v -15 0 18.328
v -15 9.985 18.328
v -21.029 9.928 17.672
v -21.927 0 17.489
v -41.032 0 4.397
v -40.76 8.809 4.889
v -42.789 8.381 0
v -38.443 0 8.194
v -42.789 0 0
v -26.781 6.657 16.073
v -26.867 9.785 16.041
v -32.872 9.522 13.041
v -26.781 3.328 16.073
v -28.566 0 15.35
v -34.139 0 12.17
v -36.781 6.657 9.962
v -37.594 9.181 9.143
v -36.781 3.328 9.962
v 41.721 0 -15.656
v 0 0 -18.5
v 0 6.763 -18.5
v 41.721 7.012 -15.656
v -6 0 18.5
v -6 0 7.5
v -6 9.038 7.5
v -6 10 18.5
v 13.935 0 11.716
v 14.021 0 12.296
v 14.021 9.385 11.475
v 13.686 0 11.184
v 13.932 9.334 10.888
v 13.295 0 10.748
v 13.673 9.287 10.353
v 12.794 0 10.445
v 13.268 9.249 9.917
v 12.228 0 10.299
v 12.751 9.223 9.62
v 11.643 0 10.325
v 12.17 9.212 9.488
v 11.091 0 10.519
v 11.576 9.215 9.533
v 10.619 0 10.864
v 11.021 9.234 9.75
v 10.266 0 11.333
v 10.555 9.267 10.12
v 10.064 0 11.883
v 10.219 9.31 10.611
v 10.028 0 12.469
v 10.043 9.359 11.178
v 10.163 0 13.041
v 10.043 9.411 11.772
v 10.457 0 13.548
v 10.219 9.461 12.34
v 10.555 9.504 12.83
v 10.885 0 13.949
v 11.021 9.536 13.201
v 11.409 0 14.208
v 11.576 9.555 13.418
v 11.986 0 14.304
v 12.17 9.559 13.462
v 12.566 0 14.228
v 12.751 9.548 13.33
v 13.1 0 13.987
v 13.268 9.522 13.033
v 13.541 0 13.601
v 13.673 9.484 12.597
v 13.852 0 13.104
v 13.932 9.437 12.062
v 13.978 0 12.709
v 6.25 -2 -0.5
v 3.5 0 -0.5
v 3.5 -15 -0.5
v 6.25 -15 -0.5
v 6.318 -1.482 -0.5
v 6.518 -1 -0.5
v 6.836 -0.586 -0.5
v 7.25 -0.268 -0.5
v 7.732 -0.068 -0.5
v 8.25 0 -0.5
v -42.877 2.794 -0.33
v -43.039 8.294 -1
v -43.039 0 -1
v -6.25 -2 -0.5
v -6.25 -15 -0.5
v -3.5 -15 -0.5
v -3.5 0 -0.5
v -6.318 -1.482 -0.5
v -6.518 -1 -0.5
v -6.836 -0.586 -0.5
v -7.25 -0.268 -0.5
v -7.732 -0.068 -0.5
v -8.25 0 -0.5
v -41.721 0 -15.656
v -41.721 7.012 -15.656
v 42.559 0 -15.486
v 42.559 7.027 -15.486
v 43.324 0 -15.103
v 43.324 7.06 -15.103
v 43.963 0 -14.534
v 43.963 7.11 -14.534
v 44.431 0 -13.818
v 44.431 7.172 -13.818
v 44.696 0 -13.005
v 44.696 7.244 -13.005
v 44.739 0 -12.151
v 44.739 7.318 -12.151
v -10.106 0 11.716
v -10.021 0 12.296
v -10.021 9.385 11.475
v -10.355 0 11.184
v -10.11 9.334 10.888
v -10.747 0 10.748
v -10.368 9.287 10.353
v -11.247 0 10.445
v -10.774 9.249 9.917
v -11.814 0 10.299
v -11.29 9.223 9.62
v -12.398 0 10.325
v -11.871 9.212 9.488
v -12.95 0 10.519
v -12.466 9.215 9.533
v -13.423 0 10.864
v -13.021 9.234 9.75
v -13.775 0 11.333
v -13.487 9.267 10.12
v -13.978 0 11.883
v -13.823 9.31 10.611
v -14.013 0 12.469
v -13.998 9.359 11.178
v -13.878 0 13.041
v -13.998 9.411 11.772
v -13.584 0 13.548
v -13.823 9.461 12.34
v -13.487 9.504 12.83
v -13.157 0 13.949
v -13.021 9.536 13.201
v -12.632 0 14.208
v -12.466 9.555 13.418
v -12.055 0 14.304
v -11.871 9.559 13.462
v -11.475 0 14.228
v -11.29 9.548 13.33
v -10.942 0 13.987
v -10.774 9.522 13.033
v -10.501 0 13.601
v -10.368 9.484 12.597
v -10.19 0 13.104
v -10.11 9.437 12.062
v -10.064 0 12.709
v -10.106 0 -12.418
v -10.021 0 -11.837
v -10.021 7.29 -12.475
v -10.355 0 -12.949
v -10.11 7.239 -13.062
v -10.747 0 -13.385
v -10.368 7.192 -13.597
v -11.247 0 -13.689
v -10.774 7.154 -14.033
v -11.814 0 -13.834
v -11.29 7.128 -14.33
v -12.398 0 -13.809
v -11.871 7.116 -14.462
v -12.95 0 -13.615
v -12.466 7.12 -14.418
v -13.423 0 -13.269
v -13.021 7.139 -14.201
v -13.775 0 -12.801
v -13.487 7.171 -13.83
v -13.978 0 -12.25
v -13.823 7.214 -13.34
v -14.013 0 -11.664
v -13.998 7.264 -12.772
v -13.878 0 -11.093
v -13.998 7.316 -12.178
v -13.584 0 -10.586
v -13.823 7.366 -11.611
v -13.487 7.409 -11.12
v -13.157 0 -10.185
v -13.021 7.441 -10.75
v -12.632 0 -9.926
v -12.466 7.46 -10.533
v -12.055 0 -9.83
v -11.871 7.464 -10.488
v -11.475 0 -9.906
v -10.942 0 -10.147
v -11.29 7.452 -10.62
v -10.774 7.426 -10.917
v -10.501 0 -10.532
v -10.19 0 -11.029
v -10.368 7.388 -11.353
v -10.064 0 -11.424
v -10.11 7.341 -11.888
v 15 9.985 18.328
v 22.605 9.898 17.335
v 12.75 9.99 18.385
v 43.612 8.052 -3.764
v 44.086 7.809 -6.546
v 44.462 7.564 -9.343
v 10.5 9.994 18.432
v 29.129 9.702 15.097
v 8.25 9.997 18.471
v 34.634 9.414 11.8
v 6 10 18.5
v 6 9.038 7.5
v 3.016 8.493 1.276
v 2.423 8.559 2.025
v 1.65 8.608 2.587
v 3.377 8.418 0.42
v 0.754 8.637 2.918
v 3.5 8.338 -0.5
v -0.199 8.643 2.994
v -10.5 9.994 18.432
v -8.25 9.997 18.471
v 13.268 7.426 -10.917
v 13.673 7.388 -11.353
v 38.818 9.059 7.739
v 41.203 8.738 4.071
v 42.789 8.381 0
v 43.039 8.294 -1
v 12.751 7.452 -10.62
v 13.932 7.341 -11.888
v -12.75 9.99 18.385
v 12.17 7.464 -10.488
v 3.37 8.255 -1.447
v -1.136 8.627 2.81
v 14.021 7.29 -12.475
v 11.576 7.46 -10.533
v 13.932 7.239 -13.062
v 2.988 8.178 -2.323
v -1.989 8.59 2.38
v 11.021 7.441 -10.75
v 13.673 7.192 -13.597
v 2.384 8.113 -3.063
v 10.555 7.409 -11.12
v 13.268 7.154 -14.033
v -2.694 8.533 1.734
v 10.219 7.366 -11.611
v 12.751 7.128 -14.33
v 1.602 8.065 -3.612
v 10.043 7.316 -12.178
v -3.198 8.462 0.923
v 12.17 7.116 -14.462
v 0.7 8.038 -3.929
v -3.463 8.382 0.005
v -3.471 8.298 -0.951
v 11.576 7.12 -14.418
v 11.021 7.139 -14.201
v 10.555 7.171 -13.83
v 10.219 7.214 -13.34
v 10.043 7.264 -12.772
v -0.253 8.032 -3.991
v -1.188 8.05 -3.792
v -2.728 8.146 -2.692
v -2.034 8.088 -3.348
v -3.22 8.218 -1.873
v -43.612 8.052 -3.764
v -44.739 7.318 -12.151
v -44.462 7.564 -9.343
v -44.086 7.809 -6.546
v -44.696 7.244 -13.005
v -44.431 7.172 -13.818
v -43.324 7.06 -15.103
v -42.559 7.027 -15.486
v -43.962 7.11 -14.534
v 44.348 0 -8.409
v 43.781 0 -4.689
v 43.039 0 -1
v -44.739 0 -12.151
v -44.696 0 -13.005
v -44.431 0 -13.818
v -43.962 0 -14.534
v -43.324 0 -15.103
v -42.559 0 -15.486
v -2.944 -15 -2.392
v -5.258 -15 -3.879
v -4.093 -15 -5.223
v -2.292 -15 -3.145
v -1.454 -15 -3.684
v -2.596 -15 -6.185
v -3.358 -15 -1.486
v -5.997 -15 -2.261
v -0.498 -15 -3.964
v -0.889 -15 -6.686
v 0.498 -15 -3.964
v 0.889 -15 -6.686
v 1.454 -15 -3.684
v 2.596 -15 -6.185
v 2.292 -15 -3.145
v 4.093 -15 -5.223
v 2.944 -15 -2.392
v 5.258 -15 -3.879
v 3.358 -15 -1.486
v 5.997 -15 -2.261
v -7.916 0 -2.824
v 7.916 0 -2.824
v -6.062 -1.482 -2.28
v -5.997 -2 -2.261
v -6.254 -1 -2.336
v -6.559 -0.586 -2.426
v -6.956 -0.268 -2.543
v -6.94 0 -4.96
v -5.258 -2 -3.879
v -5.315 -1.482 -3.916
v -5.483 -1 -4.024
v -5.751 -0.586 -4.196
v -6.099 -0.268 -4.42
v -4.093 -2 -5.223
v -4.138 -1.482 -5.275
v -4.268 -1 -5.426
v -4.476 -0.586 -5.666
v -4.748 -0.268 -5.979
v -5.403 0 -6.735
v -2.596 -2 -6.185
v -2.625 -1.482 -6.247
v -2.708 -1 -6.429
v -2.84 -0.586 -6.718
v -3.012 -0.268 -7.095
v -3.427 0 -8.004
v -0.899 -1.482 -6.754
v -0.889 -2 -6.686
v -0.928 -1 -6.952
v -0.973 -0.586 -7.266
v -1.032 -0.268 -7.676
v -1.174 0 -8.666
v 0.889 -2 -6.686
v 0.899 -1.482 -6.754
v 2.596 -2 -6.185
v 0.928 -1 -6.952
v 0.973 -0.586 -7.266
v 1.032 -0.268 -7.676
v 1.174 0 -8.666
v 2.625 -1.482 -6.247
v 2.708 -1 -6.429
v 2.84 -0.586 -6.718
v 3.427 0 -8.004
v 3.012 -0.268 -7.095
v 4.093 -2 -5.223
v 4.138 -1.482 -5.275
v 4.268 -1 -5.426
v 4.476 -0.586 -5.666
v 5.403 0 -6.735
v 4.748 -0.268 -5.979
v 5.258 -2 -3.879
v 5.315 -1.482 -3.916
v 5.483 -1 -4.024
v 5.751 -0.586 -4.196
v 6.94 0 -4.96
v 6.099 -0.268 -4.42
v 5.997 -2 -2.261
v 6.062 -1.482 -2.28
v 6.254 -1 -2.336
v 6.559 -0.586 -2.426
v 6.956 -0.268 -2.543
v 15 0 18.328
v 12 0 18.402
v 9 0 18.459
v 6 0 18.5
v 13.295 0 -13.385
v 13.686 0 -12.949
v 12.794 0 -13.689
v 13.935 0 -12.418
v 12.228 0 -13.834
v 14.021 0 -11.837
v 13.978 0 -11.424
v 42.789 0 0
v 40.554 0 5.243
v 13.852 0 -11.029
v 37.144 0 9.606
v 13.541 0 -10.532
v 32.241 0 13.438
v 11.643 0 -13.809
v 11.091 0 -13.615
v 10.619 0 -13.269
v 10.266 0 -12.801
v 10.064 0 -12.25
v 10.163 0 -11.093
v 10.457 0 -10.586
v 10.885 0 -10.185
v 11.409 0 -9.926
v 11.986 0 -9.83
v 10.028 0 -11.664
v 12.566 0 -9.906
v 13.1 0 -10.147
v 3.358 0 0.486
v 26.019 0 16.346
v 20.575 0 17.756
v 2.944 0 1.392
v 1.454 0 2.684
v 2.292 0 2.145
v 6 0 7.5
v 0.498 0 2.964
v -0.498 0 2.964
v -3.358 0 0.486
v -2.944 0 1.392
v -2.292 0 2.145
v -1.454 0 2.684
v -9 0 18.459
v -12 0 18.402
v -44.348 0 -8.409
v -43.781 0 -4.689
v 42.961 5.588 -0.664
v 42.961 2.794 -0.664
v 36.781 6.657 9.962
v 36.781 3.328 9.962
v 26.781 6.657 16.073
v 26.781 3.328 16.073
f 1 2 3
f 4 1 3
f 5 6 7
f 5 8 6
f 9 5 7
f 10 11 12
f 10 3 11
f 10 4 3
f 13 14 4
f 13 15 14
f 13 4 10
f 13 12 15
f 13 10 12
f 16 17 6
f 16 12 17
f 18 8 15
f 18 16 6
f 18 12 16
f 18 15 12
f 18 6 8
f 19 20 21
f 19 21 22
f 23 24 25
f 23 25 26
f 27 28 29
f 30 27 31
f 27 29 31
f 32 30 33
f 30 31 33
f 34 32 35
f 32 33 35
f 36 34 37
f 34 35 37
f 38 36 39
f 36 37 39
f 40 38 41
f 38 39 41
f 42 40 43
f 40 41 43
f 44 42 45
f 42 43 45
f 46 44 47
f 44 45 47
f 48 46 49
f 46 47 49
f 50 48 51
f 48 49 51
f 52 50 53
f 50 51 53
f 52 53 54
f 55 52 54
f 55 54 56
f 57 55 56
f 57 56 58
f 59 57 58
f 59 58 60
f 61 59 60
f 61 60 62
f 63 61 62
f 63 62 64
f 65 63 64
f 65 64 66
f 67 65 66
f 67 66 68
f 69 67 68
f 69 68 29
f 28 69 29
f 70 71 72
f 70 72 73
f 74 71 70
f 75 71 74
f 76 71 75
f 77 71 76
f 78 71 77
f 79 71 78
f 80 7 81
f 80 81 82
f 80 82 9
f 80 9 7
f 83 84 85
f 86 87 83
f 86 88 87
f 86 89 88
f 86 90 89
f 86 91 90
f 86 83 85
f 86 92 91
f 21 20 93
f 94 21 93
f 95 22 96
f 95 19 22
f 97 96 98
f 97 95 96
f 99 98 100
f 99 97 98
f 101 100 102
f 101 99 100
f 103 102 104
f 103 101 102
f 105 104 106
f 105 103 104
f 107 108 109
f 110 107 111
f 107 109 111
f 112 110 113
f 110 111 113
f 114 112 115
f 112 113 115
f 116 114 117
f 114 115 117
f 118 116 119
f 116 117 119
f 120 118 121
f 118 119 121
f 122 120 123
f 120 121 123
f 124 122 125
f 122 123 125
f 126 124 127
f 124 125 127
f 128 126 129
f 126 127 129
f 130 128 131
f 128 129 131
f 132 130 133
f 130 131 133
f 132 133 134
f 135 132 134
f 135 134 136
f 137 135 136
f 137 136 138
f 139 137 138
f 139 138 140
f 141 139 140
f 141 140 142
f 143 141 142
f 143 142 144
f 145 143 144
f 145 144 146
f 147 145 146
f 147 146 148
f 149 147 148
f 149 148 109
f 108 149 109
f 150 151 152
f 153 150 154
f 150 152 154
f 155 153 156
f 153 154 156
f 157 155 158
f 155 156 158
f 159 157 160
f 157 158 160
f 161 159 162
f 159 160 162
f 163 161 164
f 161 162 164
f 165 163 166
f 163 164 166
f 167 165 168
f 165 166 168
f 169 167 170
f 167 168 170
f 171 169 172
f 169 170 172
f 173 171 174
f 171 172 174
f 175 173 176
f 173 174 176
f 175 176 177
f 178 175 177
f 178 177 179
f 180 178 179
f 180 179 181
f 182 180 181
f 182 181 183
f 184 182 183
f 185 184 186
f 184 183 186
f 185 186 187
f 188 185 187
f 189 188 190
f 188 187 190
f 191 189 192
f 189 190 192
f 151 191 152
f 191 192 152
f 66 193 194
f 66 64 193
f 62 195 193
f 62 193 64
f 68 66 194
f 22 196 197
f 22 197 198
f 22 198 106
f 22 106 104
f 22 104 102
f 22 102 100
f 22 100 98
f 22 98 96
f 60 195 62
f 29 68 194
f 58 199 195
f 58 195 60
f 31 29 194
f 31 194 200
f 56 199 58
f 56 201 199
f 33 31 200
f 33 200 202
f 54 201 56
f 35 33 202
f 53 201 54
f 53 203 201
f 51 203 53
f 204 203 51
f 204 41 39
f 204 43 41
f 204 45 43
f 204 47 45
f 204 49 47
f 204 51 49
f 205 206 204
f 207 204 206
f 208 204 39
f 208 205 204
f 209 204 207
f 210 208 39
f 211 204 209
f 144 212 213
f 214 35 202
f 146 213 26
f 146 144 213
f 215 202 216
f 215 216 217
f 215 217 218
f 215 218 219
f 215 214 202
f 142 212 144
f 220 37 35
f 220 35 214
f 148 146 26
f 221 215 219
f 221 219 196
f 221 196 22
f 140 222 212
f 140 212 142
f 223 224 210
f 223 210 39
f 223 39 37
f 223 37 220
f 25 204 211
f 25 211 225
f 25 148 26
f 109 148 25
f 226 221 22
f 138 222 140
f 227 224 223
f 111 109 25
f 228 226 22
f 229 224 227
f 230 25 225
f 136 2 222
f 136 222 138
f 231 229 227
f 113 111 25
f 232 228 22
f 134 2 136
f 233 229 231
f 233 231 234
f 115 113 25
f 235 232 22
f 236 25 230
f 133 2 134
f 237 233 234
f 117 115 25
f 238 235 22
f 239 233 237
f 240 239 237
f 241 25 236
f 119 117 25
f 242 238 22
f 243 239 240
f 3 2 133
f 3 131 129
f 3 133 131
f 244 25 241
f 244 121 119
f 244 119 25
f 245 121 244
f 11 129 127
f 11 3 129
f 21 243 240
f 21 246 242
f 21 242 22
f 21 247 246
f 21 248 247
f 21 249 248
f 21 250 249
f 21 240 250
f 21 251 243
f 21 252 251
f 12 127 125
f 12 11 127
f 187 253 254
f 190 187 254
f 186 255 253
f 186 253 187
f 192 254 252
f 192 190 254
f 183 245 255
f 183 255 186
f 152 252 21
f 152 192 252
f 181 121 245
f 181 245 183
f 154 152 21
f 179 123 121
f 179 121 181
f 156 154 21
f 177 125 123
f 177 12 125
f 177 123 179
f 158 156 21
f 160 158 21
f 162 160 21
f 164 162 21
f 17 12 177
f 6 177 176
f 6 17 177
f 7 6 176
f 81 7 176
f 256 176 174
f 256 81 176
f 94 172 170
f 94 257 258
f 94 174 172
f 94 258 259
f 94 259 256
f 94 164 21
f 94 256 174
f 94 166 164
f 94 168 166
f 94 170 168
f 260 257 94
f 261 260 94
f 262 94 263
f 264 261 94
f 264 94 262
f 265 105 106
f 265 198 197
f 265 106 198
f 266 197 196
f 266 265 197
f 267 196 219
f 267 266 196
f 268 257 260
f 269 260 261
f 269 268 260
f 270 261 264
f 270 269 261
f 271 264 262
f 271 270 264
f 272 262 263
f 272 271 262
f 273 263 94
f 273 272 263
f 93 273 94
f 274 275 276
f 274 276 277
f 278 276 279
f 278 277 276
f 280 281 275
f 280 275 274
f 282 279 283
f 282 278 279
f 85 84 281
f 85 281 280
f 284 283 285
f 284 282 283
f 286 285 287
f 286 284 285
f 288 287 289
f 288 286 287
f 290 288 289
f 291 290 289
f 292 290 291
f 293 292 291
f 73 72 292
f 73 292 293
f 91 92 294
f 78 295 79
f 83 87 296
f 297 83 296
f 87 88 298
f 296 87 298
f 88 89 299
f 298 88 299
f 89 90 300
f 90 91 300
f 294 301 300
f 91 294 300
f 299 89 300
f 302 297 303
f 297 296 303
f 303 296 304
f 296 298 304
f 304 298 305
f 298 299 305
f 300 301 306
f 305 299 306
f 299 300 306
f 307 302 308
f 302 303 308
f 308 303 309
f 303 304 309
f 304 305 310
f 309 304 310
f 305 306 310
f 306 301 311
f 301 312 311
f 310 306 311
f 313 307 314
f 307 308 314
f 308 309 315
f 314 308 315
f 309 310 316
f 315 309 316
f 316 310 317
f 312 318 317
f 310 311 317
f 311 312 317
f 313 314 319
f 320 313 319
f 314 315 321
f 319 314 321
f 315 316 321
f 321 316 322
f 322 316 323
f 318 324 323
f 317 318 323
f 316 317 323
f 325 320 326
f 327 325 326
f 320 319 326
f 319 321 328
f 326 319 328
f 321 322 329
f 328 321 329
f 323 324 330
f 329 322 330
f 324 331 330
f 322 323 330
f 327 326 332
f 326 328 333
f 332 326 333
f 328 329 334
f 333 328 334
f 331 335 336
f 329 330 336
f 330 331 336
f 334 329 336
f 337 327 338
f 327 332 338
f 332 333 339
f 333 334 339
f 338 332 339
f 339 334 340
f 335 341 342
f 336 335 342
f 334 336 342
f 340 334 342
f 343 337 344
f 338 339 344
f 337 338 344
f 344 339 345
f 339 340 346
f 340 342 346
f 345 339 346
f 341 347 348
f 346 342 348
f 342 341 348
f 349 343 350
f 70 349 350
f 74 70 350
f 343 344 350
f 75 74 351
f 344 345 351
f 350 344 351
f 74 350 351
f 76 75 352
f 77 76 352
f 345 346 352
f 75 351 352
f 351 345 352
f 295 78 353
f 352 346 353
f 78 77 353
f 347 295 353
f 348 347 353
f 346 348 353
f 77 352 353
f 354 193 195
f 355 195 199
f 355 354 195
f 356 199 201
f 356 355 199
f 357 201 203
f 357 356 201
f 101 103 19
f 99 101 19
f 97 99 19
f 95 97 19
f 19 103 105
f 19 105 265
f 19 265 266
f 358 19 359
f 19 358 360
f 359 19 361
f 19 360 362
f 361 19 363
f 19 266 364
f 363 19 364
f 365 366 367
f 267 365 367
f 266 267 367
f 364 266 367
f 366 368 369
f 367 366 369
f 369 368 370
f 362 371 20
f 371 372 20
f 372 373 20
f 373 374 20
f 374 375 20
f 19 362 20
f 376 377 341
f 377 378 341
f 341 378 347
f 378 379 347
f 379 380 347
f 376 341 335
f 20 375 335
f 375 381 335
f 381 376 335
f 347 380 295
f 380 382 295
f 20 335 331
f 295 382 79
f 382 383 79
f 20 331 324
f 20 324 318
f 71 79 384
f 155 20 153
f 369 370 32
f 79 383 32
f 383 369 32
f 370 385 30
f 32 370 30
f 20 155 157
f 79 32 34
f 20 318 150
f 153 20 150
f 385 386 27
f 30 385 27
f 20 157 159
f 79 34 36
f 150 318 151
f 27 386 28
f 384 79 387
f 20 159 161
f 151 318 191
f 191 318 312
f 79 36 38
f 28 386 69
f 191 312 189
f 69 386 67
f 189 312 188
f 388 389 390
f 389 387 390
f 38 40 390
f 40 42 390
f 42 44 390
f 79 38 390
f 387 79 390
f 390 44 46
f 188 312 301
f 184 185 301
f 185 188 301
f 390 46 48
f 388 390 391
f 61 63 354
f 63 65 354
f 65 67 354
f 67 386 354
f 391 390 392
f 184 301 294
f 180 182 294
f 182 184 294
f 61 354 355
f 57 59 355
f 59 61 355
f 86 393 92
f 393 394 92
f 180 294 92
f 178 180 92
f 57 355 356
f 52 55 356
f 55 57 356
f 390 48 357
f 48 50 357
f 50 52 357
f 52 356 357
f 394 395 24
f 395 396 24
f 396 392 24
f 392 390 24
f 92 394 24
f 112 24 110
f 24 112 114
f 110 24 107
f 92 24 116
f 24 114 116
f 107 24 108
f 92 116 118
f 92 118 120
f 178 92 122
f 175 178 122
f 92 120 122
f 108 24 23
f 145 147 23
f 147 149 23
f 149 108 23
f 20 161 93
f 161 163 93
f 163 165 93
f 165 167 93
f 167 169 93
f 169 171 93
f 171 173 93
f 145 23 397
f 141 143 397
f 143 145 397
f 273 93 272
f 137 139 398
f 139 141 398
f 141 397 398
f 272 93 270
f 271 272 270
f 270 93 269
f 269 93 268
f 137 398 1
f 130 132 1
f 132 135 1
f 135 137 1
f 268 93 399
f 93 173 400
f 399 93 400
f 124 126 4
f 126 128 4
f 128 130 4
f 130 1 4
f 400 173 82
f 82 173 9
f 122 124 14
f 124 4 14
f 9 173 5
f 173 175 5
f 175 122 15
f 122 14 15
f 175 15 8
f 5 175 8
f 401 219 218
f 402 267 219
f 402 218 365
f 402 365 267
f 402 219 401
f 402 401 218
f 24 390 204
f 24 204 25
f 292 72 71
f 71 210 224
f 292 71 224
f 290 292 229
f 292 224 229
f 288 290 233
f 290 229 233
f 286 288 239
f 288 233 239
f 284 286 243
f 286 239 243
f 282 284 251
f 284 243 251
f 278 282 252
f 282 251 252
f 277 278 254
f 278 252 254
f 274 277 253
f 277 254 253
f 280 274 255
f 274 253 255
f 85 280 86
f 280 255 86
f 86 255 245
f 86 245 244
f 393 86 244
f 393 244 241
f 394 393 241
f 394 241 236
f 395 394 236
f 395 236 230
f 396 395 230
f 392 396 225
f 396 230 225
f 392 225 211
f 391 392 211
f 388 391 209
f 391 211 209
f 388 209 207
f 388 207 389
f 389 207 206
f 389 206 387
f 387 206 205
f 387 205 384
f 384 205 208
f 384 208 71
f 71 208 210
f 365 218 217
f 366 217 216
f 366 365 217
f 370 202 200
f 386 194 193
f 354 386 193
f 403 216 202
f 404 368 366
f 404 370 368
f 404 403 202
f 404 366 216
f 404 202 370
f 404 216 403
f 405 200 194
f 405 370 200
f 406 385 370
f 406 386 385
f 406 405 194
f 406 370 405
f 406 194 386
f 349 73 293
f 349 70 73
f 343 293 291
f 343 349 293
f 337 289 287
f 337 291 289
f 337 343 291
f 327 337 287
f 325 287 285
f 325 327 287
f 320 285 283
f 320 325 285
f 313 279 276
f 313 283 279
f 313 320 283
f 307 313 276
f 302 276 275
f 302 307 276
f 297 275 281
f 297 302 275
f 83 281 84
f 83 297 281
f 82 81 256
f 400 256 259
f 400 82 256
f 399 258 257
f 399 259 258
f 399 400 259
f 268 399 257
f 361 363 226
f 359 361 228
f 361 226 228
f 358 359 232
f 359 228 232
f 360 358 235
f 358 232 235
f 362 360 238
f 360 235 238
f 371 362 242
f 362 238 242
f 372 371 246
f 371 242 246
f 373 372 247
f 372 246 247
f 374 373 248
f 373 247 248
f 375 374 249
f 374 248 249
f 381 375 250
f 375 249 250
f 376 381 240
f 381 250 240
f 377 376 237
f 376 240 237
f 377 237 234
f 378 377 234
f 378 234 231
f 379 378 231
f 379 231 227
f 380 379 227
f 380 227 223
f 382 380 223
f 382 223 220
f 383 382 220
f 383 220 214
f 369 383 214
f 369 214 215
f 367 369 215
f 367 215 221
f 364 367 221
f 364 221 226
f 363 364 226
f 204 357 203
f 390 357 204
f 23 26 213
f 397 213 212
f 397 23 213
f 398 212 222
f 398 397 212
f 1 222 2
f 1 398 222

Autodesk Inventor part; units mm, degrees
ref_plane "YZ Plane" through (0, 0, 0) normal (1, 0, 0) x (0, 1, 0)
ref_plane "XZ Plane" through (0, 0, 0) normal (0, 1, 0) x (-1, 0, 0)
ref_plane "XY Plane" through (0, 0, 0) normal (0, 0, 1) x (1, 0, 0)
sketch "Skizze1" plane through (0, 0, 0) normal (0, 1, 0) x (-1, 0, 0)
  line L0 (0, -18.5) -> (0, 18.5) construction
  arc A0 (41.721, -15.6557) -> (44.7394, -12.1512) centre (41.5, -12.4133) ccw
  arc A1 (-44.7394, -12.1512) -> (-41.721, -15.6557) centre (-41.5, -12.4133) ccw
  line L1 (0, -18.5) -> (-41.721, -15.6557)
  line L2 (0, -18.5) -> (41.721, -15.6557)
  line L3 (65.5763, 0) -> (-65.5763, 0) projected
  line L4 (-6, 7.5) -> (6, 7.5)
  line L5 (6, 7.5) -> (6, 18.5)
  line L6 (6, 18.5) -> (-6, 18.5) construction
  line L7 (-6, 18.5) -> (-6, 7.5)
  line L8 (-6, 7.5) -> (6, 18.5) construction
  line L9 (6, 7.5) -> (-6, 18.5) construction
  arc A2 (-43.0393, -1) -> (-44.7394, -12.1512) centre (35, -18.603) ccw
  spline S0 degree 3 poles (-43.0393, -1) (-40.2103, 11.542) (-27.2639, 17.9936) (-15, 18.3281) knots 0 0 0 0 1 1 1 1
  arc A3 (44.7394, -12.1512) -> (43.0393, -1) centre (-35, -18.603) ccw
  spline S1 degree 3 poles (15, 18.3281) (27.2639, 17.9936) (40.2103, 11.542) (43.0393, -1) knots 0 0 0 0 1 1 1 1
  arc A4 (15, 18.3281) -> (6, 18.5) centre (0, -531.4673) ccw
  arc A5 (-6, 18.5) -> (-15, 18.3281) centre (0, -531.4673) ccw
  point P0 (0, 0)
  point P1 (0, 0)
  point P2 (0, 13)
  dimension "d3" = 6.5
  dimension "d4" = 3.9
  dimension "d5" = 83
  dimension "d6" = 12
  dimension "d9" = 80
  dimension "d10" = 70
  dimension "d12" = 30
  dimension "d13" = 550
  dimension "d14" = 26
  dimension "d15" = 11
  dimension "d16" = 1
extrude "Extrusion1" add sketch "Skizze1" along normal blind 10
sketch "Skizze2" plane through (0, 10, 0) normal (0, 1, 0) x (1, 0, 0)
  circle A0 centre (0, 0.5) radius 3.5
  line L0 (12.0208, 12.5208) -> (-12.0208, 12.5208) construction
  line L1 (-12.0208, 12.5208) -> (-12.0208, -11.5208) construction
  line L2 (-12.0208, -11.5208) -> (12.0208, -11.5208) construction
  line L3 (12.0208, -11.5208) -> (12.0208, 12.5208) construction
  line L4 (12.0208, 12.5208) -> (-12.0208, -11.5208) construction
  line L5 (-12.0208, 12.5208) -> (12.0208, -11.5208) construction
  line L6 (-12.0208, -11.5208) -> (-6.364, -17.1777) construction
  line L7 (12.0208, 12.5208) -> (17.6777, 6.864) construction
  line L8 (12.0208, -11.5208) -> (6.364, -17.1777) construction
  line L9 (-12.0208, 12.5208) -> (-17.6777, 6.864) construction
  circle A1 centre (12.0208, -11.5208) radius 2
  circle A2 centre (-12.0208, -11.5208) radius 2
  circle A3 centre (-12.0208, 12.5208) radius 2
  circle A4 centre (12.0208, 12.5208) radius 2
  point P0 (0, 18.5)
  point P1 (0, 0)
  dimension "d17" = 7
  dimension "d20" = 18
  dimension "d27" = 8
  dimension "d28" = 8
  dimension "d29" = 8
  dimension "d30" = 8
  dimension "d31" = 34
  dimension "d32" = 4
  dimension "d33" = 34
  dimension "d34" = 45
extrude "Extrusion2" cut sketch "Skizze2" against normal up to next contours A0
sketch "Skizze3" plane through (0, 0, 0) normal (0, -1, 0) x (1, 0, 0)
  circle A0 centre (0, -0.5) radius 3.5 projected
  arc A1 (-6.25, -0.5) -> (6.25, -0.5) centre (0, -0.5) ccw
  line L0 (-6.25, -0.5) -> (-3.5, -0.5)
  circle A2 centre (0, -0.5) radius 3.5 projected
  line L1 (3.5, -0.5) -> (6.25, -0.5)
  point P0 (0, 0)
  dimension "d21" = 12.5
extrude "Extrusion3" add sketch "Skizze3" along normal blind 15 contours L1 A1 L0 A0
fillet "Rundung1" radius 2 1 edges at (0, 0, -6.75)
sketch "Skizze5" plane through (0, 0, 0) normal (1, 0, 0) x (0, 1, 0)
  line L0 (10, 18.5) -> (6.7629, -18.5)
  line L1 (6.7629, -18.5) -> (10, -18.5)
  line L2 (10, -18.5) -> (10, 18.5)
  line L3 (10, 3) -> (10, -4) projected
  line L4 (10, -15.6557) -> (10, -18.5) projected
  line L5 (10, -18.5) -> (10, -15.6557) projected
  line L6 (10, -15.6557) -> (10, -12.1512) projected
  line L7 (10, -12.1512) -> (10, -1) projected
  line L8 (10, -1) -> (10, 18.3281) projected
  line L9 (10, 18.3281) -> (10, 18.5) projected
  line L10 (10, 18.5) -> (10, 7.5) projected
  line L11 (10, 7.5) -> (10, 18.5) projected
  line L12 (10, 18.5) -> (10, 18.3281) projected
  line L13 (10, 18.3281) -> (10, -1) projected
  line L14 (10, -1) -> (10, -12.1512) projected
  line L15 (10, -12.1512) -> (10, -15.6557) projected
  point P0 (0, 0)
  dimension "d35" = 5
extrude "Extrusion4" cut sketch "Skizze5" along normal through all both and the other way through all
sketch "Skizze6" plane through (-6, 9.0376, 7.5) normal (0, 0.9962, -0.0872) x (1, 0, 0)
  line L0 (18.0208, 20.0514) -> (-6.0208, 20.0514) construction
  line L1 (-6.0208, 20.0514) -> (-6.0208, -3.9903) construction
  line L2 (-6.0208, -3.9903) -> (18.0208, -3.9903) construction
  line L3 (18.0208, -3.9903) -> (18.0208, 20.0514) construction
  ellipse E0 centre (6, 8.0306) end of major axis (6, 11.5439) minor radius 3.5 projected
  line L4 (18.0208, 20.0514) -> (-6.0208, -3.9903) construction
  line L5 (-6.0208, 20.0514) -> (18.0208, -3.9903) construction
  line L6 (-6.0208, -3.9903) -> (-2.4853, -7.5258) construction
  line L7 (18.0208, 20.0514) -> (21.5563, 16.5158) construction
  circle A0 centre (18.0208, -3.9903) radius 2
  circle A1 centre (-6.0208, -3.9903) radius 2
  circle A2 centre (-6.0208, 20.0514) radius 2
  circle A3 centre (18.0208, 20.0514) radius 2
  point P0 (6, 8.2591)
  dimension "d38" = 45
  dimension "d39" = 5
  dimension "d40" = 5
  dimension "d41" = 34
  dimension "d42" = 4
extrude "Extrusion5" cut sketch "Skizze6" against normal blind 10 contours A0 | A1 | A2 | A3
equation "\"G_L\" = 0"
equation "\"G_H\" = 0"
equation "\"G_B\" = 0"
properties part number "Motormount_5grad" material "GEDA Stahl"
